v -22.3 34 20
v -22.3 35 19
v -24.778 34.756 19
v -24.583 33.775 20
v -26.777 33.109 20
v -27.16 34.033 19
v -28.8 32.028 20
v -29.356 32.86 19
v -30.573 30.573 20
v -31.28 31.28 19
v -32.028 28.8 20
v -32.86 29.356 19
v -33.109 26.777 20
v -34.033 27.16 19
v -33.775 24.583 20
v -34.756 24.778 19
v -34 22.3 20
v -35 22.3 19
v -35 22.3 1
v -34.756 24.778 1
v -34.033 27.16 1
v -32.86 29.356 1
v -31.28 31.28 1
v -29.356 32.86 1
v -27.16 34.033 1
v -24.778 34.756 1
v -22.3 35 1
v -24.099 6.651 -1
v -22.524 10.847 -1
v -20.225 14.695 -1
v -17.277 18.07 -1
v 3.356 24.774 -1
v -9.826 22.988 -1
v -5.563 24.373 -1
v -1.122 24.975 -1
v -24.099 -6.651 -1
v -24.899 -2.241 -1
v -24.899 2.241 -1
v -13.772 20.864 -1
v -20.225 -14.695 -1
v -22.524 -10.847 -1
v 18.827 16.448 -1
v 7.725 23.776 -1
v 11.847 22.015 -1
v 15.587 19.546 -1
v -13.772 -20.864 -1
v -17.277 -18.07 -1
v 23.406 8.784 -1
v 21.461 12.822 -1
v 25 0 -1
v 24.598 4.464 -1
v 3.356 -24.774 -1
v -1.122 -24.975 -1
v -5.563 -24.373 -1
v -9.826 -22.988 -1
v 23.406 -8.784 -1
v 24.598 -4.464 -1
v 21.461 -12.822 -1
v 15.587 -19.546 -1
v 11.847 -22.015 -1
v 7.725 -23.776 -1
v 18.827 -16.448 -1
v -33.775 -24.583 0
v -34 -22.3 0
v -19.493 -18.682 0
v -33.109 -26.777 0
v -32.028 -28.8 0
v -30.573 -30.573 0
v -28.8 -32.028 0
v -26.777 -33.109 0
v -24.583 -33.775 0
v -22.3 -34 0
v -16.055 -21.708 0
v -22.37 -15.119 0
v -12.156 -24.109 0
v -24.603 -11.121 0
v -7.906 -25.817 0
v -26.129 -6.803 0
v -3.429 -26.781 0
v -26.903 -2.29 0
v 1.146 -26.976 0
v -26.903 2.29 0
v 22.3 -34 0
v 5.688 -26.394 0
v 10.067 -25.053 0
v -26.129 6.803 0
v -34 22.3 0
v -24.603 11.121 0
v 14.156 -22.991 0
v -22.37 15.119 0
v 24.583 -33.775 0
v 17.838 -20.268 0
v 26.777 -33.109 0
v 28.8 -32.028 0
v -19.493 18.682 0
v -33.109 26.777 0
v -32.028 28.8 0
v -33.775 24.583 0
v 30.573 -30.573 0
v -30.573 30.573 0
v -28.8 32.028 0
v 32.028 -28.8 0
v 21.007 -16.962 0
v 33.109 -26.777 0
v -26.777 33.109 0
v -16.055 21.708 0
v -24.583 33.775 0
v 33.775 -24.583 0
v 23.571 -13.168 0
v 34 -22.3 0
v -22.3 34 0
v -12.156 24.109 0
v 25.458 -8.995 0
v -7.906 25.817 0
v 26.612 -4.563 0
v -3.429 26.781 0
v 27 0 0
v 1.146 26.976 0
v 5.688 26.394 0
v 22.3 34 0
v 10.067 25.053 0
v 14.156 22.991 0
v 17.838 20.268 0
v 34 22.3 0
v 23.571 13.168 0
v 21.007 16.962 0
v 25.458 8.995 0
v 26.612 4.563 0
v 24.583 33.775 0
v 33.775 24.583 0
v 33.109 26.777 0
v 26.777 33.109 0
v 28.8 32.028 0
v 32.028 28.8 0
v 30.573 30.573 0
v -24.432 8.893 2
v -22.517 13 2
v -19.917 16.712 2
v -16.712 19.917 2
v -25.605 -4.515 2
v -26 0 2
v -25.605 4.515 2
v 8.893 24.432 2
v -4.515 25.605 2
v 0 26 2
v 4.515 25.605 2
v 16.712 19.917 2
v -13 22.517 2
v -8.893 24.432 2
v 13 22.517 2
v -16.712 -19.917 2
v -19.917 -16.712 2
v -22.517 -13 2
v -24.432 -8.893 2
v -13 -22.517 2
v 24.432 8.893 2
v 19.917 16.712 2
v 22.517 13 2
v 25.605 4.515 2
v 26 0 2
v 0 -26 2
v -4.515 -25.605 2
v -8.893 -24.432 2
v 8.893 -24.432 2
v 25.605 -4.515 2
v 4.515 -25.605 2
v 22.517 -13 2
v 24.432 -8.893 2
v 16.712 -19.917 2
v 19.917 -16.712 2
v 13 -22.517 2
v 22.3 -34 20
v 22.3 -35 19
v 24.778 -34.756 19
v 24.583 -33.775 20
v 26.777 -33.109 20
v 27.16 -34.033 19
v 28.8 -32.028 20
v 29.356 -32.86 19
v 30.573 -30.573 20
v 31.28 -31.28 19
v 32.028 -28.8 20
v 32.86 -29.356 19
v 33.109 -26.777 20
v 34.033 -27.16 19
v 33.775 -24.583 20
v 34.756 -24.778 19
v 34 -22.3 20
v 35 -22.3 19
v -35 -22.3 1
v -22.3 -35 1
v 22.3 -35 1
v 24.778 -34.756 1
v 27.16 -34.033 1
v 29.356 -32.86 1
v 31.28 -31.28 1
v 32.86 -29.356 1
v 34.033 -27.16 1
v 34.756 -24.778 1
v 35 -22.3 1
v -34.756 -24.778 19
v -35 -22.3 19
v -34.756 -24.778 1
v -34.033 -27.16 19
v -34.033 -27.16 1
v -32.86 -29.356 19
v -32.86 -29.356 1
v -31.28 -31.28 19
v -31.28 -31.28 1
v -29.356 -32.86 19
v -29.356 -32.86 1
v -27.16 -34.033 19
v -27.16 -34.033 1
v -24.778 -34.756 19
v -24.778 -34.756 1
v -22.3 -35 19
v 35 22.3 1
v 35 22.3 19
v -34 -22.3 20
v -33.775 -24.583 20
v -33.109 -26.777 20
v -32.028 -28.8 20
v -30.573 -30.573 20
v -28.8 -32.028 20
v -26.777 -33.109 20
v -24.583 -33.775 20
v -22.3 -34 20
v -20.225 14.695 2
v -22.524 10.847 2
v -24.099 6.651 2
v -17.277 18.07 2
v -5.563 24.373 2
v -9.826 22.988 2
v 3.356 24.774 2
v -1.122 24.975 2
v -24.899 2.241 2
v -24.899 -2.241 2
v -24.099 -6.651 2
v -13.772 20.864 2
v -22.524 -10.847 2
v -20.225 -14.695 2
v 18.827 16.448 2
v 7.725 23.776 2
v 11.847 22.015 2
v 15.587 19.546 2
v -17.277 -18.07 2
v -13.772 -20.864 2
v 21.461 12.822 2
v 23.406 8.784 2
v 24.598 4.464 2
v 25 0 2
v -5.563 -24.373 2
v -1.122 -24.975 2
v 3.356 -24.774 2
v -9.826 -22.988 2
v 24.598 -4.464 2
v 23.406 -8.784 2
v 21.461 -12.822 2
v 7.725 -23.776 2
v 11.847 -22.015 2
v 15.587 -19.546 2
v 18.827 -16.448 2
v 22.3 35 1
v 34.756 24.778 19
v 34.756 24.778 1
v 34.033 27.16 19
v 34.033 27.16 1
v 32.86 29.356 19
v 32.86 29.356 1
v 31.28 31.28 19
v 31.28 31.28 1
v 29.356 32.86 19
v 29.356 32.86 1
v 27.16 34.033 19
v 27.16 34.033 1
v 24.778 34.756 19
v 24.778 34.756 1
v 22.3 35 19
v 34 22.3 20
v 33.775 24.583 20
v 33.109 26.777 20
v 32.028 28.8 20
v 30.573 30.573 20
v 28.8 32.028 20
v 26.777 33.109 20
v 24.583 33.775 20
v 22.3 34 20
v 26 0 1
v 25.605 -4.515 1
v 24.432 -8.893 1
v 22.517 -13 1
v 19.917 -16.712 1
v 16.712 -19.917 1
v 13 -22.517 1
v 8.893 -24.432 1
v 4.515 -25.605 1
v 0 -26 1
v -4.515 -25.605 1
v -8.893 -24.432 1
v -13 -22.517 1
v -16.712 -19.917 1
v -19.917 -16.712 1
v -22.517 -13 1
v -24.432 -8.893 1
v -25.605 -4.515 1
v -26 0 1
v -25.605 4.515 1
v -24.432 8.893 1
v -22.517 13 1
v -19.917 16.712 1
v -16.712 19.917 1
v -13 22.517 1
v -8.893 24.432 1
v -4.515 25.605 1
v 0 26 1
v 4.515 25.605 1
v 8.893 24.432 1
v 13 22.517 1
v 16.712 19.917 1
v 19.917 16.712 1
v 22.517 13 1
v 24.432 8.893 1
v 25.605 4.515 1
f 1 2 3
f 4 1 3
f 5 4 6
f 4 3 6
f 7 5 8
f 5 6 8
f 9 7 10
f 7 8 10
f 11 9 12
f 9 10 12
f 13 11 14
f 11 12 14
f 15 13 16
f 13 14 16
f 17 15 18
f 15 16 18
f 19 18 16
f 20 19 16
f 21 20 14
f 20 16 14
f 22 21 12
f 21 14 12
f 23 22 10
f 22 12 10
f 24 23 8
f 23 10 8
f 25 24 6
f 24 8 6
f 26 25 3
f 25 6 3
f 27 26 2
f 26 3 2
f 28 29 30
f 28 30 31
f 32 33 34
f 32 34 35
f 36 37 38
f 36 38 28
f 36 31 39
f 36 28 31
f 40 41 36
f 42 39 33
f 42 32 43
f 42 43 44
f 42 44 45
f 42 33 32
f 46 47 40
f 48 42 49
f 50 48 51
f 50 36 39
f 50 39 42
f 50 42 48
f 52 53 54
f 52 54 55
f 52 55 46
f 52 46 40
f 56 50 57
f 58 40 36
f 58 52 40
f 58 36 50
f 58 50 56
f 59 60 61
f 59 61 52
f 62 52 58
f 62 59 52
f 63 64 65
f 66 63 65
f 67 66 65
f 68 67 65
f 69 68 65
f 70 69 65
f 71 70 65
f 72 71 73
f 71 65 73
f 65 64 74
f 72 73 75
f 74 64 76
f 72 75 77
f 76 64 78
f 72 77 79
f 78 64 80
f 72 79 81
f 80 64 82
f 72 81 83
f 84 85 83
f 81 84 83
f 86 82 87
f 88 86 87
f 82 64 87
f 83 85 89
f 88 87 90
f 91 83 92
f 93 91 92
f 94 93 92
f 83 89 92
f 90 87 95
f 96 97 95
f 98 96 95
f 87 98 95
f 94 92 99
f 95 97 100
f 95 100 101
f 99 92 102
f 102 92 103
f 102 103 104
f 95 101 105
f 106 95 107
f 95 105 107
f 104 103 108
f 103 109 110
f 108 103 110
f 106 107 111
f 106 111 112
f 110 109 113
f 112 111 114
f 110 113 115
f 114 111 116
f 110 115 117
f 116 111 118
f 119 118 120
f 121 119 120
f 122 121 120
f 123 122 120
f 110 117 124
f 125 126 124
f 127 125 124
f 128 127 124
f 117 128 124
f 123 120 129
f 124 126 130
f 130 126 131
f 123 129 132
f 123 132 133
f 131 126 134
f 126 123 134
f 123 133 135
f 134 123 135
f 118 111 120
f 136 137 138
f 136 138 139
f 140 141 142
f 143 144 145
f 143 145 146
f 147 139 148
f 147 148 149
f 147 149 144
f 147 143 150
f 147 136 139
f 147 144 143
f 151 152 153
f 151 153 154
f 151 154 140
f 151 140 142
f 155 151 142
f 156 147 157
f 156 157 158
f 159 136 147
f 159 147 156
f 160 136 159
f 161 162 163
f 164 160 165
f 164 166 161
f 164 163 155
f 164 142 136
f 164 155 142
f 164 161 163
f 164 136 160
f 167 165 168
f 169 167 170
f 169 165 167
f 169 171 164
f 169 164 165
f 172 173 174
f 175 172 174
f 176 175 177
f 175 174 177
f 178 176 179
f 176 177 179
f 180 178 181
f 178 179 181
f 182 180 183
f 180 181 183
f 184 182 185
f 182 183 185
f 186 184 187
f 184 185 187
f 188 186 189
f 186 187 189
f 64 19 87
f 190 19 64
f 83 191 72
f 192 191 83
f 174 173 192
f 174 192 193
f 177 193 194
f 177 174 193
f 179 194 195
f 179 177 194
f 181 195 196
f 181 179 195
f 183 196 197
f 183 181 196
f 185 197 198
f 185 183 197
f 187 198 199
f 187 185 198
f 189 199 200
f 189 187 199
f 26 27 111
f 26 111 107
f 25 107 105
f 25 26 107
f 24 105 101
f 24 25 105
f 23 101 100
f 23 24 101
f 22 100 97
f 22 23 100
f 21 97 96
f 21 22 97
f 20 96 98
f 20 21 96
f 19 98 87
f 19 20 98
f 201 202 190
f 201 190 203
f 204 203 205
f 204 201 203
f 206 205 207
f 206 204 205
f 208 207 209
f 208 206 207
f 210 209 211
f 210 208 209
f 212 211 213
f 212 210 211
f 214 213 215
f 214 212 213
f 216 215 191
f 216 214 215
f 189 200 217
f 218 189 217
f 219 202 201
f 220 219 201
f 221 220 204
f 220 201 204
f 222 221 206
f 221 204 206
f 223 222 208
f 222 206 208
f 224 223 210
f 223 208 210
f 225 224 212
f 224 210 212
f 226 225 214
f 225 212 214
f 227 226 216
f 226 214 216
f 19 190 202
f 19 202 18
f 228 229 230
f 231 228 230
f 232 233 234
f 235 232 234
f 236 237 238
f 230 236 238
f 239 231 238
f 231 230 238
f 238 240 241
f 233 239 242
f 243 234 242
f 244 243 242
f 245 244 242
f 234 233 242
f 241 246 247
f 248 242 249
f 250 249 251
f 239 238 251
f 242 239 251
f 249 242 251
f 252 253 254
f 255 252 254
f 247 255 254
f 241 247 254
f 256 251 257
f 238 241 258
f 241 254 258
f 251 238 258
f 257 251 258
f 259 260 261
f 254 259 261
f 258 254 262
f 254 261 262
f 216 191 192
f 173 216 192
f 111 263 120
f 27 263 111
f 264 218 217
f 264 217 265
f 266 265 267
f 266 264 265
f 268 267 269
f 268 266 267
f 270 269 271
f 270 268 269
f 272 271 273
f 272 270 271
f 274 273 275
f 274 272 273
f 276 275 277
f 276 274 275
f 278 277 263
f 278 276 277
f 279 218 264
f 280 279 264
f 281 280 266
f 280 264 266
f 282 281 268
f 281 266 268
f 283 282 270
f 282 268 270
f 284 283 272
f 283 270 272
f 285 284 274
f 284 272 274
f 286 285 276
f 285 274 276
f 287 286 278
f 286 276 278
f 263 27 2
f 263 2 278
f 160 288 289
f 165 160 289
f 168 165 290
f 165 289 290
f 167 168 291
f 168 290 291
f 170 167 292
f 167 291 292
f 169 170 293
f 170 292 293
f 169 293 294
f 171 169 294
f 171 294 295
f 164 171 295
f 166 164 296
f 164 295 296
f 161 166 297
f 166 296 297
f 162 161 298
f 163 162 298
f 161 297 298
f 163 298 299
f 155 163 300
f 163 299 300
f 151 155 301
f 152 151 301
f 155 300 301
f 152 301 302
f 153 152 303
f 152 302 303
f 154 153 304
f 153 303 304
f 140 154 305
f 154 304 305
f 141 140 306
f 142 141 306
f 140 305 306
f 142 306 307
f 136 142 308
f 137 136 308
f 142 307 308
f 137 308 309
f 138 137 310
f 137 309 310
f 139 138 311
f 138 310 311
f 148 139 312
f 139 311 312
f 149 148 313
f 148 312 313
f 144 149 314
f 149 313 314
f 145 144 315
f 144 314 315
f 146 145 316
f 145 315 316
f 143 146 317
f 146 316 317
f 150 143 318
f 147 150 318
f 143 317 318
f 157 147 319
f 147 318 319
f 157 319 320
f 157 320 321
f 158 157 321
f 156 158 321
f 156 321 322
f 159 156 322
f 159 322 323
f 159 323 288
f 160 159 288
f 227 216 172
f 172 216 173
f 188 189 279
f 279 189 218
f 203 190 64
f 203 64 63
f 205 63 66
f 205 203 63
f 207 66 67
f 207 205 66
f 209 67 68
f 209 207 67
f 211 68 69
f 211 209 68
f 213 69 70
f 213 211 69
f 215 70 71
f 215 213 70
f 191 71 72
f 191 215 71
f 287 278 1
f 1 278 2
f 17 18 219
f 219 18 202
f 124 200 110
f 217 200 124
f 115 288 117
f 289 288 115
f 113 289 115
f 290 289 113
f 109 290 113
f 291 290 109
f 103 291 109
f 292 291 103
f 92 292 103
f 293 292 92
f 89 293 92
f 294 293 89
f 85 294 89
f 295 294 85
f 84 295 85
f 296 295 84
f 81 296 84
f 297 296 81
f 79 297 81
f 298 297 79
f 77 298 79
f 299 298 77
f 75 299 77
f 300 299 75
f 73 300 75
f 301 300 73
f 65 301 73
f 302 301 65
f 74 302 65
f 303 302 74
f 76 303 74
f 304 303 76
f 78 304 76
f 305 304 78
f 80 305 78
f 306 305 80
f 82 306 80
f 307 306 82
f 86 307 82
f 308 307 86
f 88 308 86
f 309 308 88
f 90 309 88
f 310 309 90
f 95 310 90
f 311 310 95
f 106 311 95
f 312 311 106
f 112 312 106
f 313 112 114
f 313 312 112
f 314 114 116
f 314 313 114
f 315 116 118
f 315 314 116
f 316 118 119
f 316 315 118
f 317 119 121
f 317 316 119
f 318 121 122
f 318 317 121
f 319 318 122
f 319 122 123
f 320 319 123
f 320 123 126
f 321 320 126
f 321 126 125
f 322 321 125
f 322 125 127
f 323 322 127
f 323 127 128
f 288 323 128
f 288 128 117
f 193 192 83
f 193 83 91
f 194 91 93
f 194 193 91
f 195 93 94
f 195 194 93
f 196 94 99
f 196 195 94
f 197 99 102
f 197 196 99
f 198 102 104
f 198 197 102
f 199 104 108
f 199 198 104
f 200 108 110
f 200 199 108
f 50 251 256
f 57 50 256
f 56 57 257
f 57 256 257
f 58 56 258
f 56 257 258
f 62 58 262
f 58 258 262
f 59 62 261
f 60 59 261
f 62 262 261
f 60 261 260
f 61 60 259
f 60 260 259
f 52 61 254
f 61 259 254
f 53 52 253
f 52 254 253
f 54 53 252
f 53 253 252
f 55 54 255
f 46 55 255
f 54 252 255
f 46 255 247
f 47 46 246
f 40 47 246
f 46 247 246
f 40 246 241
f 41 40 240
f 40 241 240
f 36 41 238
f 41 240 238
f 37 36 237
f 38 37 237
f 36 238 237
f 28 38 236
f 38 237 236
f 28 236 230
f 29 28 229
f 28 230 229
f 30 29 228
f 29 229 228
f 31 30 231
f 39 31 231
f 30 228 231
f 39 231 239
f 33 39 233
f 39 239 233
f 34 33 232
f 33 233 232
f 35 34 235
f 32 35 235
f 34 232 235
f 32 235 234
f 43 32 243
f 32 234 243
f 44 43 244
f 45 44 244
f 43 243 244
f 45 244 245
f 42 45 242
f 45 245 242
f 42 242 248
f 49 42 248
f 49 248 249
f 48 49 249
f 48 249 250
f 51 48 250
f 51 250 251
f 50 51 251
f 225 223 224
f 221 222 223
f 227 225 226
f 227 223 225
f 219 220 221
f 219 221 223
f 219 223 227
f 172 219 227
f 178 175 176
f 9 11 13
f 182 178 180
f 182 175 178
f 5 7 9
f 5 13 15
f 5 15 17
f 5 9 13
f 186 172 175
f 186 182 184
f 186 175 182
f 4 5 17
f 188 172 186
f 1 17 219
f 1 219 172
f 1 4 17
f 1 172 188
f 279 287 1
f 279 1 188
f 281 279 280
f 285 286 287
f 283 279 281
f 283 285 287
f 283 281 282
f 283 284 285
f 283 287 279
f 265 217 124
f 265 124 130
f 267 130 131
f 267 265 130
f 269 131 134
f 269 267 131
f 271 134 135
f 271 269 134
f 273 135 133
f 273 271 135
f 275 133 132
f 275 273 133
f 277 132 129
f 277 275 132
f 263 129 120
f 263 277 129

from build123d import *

# Parameters (mm, degrees)
F0_W     = 70
F0_H     = 70
F1_DEPTH = 20
F2_R     = 12.7
F3_R     = 26
F3_R_2   = 25
F4_DEPTH = 2
F5_R     = 25
F6_DEPTH = 3
F7_SIZE  = 1


with BuildPart() as f1:
    # F0 (on Top) → F1 (new body)
    with BuildSketch(Plane.XY):
        Rectangle(F0_W, F0_H)
    extrude(amount=F1_DEPTH)

    # F2
    f2_edges = [f1.edges().sort_by_distance(p)[0] for p in [
        (35, -35, 10),
        (-35, -35, 10),
        (35, 35, 10),
        (-35, 35, 10),
    ]]
    fillet(f2_edges, radius=F2_R)

    # F3 (on face) → F4 (cut)
    with BuildSketch(Plane(origin=(0, 0, 0), x_dir=(1, 0, 0), z_dir=(0, 0, -1))):
        Circle(F3_R)
        Circle(F3_R_2, mode=Mode.SUBTRACT)
        Circle(F3_R_2)
    extrude(amount=-F4_DEPTH, mode=Mode.SUBTRACT)

    # F7
    f7_edges = [f1.edges().sort_by_distance(p)[0] for p in [
        (0, -35, 20),
        (-31.280256, -31.280256, 20),
        (31.280256, -31.280256, 20),
        (-35, 0, 20),
        (35, 0, 20),
        (-31.280256, 31.280256, 20),
        (31.280256, 31.280256, 20),
        (0, 35, 20),
        (0, -35, 0),
        (-31.280256, -31.280256, 0),
        (31.280256, -31.280256, 0),
        (-35, 0, 0),
        (35, 0, 0),
        (-31.280256, 31.280256, 0),
        (31.280256, 31.280256, 0),
        (0, 35, 0),
        (-26, 0, 0),
    ]]
    chamfer(f7_edges, length=F7_SIZE)


with BuildPart() as f6:
    # F5 (on face) → F6 (new body)
    with BuildSketch(Plane(origin=(0, 0, 2), x_dir=(1, 0, 0), z_dir=(0, 0, -1))):
        Circle(F5_R)
    extrude(amount=F6_DEPTH)


solid = Compound([f1.part, f6.part])
